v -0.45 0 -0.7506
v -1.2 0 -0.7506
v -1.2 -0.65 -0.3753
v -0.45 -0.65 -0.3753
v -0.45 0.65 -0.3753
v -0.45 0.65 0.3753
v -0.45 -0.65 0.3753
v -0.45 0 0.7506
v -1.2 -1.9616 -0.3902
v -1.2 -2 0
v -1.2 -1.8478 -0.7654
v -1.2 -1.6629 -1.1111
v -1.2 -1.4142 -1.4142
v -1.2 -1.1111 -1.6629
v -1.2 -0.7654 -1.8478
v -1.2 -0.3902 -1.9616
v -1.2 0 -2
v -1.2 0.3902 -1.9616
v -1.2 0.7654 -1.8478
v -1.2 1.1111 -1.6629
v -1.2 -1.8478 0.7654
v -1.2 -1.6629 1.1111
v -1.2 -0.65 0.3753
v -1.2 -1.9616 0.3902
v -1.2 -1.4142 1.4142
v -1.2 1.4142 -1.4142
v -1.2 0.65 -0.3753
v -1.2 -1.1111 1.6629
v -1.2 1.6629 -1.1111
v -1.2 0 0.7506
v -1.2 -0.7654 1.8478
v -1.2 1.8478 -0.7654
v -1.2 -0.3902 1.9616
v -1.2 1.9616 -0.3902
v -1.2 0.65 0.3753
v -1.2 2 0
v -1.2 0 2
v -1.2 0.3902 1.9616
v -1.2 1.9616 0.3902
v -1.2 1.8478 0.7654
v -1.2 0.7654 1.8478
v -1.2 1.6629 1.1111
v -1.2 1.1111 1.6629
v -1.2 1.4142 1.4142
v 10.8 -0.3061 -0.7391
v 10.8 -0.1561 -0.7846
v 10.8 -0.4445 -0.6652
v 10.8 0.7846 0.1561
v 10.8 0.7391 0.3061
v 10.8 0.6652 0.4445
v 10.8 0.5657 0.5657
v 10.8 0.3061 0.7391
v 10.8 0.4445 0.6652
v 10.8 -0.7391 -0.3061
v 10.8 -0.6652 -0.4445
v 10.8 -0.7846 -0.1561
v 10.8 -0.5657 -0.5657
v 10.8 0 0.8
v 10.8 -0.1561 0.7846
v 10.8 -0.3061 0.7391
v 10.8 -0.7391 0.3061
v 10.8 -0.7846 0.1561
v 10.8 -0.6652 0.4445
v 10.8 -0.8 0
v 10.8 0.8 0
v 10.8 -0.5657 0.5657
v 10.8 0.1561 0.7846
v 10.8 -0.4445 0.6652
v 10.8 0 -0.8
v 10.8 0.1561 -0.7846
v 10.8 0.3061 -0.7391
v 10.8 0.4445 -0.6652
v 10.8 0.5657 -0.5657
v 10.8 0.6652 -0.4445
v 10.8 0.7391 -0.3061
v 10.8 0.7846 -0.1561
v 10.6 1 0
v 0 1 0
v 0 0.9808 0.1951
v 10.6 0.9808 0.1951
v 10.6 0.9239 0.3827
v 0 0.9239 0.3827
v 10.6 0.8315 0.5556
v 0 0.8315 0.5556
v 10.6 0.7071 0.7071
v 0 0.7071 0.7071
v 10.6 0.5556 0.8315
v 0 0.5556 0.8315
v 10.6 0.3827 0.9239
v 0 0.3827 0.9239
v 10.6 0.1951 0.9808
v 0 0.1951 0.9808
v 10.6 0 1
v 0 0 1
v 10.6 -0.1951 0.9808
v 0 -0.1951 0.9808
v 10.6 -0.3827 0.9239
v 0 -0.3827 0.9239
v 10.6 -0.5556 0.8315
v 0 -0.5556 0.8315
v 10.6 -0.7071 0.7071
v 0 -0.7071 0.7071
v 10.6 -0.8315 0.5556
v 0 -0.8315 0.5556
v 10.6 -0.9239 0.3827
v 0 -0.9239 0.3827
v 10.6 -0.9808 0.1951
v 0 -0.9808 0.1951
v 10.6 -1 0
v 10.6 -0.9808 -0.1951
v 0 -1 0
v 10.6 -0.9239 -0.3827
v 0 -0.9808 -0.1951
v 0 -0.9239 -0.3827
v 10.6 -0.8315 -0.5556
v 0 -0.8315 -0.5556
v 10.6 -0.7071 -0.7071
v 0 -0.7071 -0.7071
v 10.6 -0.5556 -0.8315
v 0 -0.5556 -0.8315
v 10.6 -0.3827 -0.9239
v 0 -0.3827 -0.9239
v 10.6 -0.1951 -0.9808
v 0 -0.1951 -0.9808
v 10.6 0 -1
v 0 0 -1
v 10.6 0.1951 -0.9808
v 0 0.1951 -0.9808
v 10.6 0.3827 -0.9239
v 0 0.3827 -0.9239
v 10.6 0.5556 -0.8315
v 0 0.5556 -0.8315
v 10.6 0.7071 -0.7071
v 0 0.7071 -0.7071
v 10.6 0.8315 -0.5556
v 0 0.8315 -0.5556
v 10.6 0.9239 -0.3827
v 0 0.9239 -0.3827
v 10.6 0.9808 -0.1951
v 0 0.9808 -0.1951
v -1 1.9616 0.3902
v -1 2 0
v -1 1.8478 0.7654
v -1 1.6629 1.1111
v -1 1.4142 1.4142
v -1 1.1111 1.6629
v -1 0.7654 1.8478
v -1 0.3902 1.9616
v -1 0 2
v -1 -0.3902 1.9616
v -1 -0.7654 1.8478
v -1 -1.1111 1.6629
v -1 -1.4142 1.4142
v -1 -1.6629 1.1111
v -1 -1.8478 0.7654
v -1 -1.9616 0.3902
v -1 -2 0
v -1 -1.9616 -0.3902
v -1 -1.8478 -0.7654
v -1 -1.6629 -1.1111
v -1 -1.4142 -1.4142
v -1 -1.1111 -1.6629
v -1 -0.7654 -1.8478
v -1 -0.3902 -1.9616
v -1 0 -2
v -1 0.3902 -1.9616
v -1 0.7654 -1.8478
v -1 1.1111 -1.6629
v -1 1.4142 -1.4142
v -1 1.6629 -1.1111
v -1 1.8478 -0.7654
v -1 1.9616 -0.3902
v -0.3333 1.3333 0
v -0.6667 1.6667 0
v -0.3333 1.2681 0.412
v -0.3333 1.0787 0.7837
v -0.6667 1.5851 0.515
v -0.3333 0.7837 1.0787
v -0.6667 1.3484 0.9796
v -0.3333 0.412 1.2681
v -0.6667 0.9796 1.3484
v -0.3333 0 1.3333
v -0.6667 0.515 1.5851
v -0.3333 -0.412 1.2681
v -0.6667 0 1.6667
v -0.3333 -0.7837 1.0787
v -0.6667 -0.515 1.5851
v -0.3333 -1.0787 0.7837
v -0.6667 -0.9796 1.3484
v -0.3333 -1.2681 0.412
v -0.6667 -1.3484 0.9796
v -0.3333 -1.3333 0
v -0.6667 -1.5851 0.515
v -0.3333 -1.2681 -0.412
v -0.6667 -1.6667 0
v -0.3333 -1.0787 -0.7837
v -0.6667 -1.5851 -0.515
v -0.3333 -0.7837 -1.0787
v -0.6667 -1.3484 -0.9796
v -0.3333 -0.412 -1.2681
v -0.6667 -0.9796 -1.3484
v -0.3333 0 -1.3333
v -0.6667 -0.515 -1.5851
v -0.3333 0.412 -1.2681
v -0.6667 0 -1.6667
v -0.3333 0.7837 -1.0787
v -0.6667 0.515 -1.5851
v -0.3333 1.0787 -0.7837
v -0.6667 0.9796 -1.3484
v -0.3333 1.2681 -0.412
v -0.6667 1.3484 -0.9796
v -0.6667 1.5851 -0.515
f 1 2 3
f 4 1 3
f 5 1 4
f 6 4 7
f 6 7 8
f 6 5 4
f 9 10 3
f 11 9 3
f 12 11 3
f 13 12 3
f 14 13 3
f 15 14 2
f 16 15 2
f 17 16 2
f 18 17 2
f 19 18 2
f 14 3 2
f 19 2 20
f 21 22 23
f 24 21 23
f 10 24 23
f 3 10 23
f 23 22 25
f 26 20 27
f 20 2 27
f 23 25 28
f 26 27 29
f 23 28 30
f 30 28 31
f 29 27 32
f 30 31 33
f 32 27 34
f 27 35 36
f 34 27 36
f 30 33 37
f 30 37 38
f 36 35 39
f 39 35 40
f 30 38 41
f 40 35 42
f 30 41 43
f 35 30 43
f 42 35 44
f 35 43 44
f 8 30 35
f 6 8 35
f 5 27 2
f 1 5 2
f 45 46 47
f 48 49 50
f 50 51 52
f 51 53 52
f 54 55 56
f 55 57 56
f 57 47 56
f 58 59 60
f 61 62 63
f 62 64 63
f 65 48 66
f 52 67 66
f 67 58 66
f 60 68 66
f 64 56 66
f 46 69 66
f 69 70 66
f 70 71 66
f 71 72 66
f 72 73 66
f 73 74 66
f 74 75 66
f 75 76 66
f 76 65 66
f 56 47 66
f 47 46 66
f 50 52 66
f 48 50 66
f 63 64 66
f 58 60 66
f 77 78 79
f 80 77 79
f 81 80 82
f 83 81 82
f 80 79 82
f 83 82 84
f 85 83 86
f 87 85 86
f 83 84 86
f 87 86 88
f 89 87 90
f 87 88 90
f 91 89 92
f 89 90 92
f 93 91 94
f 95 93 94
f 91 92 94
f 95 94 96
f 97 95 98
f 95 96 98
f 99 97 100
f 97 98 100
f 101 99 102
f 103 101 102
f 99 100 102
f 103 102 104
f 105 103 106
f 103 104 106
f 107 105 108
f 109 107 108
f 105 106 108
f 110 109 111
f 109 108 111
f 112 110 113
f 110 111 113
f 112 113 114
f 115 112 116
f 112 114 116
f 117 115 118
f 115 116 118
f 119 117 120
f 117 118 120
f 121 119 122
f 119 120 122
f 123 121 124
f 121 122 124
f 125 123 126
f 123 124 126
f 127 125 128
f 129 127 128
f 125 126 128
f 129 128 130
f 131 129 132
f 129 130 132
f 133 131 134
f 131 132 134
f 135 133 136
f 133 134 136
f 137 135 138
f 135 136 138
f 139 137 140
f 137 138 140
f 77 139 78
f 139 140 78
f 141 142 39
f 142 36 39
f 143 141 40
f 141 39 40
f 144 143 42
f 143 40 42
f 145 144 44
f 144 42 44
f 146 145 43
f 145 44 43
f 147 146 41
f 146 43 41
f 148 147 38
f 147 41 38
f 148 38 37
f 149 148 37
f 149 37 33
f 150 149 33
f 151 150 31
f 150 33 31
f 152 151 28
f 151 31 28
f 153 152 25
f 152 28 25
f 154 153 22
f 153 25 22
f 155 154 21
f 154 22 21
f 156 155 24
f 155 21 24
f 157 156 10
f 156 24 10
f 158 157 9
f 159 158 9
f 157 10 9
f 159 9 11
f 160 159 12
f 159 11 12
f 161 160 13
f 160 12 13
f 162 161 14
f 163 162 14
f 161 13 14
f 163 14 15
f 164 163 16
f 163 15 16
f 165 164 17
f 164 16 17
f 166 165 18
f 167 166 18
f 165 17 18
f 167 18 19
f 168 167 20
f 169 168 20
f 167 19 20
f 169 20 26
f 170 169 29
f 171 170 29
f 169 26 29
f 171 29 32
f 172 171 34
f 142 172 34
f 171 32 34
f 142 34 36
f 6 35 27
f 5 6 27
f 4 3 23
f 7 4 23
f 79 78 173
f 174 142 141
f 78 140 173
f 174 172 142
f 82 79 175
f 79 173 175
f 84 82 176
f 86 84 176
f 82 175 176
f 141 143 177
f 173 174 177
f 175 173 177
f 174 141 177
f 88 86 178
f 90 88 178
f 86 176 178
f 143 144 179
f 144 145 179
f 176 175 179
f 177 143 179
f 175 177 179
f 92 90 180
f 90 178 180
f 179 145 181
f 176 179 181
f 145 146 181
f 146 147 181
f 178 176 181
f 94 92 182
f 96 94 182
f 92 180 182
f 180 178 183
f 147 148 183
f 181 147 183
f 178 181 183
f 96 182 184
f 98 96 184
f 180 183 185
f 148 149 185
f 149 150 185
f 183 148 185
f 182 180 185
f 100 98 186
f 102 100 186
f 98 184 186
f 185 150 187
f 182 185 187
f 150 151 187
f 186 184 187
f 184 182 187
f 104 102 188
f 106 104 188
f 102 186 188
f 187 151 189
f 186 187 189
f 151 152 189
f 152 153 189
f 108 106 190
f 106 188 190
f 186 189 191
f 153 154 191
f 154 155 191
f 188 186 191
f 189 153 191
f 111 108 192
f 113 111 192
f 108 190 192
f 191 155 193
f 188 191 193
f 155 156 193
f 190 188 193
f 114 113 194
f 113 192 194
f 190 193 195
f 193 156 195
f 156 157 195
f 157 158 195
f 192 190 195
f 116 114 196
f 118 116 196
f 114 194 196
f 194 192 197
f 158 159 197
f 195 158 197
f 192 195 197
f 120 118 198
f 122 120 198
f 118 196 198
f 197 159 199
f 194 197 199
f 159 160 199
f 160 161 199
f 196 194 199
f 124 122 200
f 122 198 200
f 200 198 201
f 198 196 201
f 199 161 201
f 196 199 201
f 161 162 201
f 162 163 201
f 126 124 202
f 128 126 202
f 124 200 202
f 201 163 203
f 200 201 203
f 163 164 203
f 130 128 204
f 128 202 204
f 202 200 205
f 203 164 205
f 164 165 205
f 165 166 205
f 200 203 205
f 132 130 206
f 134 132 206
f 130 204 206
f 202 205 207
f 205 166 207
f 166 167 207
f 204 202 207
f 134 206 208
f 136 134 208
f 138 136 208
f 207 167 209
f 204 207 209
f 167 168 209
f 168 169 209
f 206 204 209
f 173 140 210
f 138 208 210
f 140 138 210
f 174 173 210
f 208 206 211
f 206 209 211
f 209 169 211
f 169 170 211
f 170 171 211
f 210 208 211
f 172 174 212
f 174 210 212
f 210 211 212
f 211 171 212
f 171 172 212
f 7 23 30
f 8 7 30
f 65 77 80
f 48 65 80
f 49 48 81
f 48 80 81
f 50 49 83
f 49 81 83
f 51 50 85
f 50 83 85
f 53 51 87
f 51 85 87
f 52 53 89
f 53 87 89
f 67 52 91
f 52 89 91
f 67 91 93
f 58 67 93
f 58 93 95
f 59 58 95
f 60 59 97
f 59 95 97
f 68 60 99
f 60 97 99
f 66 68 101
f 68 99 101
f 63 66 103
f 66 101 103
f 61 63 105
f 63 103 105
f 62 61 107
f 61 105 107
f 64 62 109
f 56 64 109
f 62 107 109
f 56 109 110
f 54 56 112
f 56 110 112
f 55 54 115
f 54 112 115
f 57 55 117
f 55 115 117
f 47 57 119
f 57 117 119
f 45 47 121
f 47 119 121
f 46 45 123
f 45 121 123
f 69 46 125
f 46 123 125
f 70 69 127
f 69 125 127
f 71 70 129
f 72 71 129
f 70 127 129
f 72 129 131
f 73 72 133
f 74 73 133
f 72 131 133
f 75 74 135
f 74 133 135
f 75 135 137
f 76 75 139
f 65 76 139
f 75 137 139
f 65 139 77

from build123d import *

# Parameters (mm, degrees)
CHAMFER1_SIZE      = 0.2
CUT_EXTRUDE1_DEPTH = 0.75


with BuildPart() as part:
    # Sketch1 → Revolve1 (revolve)
    with BuildSketch(Plane.XY):
        Polygon((0, 1), (-1, 2), (-1.2, 2), (-1.2, 0), (10.8, 0), (10.8, 1), align=None)
    revolve(axis=Axis((-1.2, 0, 0), (1, 0, 0)))

    # Chamfer1
    chamfer1_edges = [part.edges().sort_by_distance(p)[0] for p in [
        (10.8, -1, 0),
    ]]
    chamfer(chamfer1_edges, length=CHAMFER1_SIZE)

    # Sketch2 → Cut-Extrude1 (cut)
    with BuildSketch(Plane.ZY.offset(1.2)):
        Polygon((-0.75055535, 0), (-0.375277675, -0.65), (0.375277675, -0.65), (0.75055535, 0), (0.375277675, 0.65), (-0.375277675, 0.65), align=None)
    extrude(amount=-CUT_EXTRUDE1_DEPTH, mode=Mode.SUBTRACT)


solid = part.part
